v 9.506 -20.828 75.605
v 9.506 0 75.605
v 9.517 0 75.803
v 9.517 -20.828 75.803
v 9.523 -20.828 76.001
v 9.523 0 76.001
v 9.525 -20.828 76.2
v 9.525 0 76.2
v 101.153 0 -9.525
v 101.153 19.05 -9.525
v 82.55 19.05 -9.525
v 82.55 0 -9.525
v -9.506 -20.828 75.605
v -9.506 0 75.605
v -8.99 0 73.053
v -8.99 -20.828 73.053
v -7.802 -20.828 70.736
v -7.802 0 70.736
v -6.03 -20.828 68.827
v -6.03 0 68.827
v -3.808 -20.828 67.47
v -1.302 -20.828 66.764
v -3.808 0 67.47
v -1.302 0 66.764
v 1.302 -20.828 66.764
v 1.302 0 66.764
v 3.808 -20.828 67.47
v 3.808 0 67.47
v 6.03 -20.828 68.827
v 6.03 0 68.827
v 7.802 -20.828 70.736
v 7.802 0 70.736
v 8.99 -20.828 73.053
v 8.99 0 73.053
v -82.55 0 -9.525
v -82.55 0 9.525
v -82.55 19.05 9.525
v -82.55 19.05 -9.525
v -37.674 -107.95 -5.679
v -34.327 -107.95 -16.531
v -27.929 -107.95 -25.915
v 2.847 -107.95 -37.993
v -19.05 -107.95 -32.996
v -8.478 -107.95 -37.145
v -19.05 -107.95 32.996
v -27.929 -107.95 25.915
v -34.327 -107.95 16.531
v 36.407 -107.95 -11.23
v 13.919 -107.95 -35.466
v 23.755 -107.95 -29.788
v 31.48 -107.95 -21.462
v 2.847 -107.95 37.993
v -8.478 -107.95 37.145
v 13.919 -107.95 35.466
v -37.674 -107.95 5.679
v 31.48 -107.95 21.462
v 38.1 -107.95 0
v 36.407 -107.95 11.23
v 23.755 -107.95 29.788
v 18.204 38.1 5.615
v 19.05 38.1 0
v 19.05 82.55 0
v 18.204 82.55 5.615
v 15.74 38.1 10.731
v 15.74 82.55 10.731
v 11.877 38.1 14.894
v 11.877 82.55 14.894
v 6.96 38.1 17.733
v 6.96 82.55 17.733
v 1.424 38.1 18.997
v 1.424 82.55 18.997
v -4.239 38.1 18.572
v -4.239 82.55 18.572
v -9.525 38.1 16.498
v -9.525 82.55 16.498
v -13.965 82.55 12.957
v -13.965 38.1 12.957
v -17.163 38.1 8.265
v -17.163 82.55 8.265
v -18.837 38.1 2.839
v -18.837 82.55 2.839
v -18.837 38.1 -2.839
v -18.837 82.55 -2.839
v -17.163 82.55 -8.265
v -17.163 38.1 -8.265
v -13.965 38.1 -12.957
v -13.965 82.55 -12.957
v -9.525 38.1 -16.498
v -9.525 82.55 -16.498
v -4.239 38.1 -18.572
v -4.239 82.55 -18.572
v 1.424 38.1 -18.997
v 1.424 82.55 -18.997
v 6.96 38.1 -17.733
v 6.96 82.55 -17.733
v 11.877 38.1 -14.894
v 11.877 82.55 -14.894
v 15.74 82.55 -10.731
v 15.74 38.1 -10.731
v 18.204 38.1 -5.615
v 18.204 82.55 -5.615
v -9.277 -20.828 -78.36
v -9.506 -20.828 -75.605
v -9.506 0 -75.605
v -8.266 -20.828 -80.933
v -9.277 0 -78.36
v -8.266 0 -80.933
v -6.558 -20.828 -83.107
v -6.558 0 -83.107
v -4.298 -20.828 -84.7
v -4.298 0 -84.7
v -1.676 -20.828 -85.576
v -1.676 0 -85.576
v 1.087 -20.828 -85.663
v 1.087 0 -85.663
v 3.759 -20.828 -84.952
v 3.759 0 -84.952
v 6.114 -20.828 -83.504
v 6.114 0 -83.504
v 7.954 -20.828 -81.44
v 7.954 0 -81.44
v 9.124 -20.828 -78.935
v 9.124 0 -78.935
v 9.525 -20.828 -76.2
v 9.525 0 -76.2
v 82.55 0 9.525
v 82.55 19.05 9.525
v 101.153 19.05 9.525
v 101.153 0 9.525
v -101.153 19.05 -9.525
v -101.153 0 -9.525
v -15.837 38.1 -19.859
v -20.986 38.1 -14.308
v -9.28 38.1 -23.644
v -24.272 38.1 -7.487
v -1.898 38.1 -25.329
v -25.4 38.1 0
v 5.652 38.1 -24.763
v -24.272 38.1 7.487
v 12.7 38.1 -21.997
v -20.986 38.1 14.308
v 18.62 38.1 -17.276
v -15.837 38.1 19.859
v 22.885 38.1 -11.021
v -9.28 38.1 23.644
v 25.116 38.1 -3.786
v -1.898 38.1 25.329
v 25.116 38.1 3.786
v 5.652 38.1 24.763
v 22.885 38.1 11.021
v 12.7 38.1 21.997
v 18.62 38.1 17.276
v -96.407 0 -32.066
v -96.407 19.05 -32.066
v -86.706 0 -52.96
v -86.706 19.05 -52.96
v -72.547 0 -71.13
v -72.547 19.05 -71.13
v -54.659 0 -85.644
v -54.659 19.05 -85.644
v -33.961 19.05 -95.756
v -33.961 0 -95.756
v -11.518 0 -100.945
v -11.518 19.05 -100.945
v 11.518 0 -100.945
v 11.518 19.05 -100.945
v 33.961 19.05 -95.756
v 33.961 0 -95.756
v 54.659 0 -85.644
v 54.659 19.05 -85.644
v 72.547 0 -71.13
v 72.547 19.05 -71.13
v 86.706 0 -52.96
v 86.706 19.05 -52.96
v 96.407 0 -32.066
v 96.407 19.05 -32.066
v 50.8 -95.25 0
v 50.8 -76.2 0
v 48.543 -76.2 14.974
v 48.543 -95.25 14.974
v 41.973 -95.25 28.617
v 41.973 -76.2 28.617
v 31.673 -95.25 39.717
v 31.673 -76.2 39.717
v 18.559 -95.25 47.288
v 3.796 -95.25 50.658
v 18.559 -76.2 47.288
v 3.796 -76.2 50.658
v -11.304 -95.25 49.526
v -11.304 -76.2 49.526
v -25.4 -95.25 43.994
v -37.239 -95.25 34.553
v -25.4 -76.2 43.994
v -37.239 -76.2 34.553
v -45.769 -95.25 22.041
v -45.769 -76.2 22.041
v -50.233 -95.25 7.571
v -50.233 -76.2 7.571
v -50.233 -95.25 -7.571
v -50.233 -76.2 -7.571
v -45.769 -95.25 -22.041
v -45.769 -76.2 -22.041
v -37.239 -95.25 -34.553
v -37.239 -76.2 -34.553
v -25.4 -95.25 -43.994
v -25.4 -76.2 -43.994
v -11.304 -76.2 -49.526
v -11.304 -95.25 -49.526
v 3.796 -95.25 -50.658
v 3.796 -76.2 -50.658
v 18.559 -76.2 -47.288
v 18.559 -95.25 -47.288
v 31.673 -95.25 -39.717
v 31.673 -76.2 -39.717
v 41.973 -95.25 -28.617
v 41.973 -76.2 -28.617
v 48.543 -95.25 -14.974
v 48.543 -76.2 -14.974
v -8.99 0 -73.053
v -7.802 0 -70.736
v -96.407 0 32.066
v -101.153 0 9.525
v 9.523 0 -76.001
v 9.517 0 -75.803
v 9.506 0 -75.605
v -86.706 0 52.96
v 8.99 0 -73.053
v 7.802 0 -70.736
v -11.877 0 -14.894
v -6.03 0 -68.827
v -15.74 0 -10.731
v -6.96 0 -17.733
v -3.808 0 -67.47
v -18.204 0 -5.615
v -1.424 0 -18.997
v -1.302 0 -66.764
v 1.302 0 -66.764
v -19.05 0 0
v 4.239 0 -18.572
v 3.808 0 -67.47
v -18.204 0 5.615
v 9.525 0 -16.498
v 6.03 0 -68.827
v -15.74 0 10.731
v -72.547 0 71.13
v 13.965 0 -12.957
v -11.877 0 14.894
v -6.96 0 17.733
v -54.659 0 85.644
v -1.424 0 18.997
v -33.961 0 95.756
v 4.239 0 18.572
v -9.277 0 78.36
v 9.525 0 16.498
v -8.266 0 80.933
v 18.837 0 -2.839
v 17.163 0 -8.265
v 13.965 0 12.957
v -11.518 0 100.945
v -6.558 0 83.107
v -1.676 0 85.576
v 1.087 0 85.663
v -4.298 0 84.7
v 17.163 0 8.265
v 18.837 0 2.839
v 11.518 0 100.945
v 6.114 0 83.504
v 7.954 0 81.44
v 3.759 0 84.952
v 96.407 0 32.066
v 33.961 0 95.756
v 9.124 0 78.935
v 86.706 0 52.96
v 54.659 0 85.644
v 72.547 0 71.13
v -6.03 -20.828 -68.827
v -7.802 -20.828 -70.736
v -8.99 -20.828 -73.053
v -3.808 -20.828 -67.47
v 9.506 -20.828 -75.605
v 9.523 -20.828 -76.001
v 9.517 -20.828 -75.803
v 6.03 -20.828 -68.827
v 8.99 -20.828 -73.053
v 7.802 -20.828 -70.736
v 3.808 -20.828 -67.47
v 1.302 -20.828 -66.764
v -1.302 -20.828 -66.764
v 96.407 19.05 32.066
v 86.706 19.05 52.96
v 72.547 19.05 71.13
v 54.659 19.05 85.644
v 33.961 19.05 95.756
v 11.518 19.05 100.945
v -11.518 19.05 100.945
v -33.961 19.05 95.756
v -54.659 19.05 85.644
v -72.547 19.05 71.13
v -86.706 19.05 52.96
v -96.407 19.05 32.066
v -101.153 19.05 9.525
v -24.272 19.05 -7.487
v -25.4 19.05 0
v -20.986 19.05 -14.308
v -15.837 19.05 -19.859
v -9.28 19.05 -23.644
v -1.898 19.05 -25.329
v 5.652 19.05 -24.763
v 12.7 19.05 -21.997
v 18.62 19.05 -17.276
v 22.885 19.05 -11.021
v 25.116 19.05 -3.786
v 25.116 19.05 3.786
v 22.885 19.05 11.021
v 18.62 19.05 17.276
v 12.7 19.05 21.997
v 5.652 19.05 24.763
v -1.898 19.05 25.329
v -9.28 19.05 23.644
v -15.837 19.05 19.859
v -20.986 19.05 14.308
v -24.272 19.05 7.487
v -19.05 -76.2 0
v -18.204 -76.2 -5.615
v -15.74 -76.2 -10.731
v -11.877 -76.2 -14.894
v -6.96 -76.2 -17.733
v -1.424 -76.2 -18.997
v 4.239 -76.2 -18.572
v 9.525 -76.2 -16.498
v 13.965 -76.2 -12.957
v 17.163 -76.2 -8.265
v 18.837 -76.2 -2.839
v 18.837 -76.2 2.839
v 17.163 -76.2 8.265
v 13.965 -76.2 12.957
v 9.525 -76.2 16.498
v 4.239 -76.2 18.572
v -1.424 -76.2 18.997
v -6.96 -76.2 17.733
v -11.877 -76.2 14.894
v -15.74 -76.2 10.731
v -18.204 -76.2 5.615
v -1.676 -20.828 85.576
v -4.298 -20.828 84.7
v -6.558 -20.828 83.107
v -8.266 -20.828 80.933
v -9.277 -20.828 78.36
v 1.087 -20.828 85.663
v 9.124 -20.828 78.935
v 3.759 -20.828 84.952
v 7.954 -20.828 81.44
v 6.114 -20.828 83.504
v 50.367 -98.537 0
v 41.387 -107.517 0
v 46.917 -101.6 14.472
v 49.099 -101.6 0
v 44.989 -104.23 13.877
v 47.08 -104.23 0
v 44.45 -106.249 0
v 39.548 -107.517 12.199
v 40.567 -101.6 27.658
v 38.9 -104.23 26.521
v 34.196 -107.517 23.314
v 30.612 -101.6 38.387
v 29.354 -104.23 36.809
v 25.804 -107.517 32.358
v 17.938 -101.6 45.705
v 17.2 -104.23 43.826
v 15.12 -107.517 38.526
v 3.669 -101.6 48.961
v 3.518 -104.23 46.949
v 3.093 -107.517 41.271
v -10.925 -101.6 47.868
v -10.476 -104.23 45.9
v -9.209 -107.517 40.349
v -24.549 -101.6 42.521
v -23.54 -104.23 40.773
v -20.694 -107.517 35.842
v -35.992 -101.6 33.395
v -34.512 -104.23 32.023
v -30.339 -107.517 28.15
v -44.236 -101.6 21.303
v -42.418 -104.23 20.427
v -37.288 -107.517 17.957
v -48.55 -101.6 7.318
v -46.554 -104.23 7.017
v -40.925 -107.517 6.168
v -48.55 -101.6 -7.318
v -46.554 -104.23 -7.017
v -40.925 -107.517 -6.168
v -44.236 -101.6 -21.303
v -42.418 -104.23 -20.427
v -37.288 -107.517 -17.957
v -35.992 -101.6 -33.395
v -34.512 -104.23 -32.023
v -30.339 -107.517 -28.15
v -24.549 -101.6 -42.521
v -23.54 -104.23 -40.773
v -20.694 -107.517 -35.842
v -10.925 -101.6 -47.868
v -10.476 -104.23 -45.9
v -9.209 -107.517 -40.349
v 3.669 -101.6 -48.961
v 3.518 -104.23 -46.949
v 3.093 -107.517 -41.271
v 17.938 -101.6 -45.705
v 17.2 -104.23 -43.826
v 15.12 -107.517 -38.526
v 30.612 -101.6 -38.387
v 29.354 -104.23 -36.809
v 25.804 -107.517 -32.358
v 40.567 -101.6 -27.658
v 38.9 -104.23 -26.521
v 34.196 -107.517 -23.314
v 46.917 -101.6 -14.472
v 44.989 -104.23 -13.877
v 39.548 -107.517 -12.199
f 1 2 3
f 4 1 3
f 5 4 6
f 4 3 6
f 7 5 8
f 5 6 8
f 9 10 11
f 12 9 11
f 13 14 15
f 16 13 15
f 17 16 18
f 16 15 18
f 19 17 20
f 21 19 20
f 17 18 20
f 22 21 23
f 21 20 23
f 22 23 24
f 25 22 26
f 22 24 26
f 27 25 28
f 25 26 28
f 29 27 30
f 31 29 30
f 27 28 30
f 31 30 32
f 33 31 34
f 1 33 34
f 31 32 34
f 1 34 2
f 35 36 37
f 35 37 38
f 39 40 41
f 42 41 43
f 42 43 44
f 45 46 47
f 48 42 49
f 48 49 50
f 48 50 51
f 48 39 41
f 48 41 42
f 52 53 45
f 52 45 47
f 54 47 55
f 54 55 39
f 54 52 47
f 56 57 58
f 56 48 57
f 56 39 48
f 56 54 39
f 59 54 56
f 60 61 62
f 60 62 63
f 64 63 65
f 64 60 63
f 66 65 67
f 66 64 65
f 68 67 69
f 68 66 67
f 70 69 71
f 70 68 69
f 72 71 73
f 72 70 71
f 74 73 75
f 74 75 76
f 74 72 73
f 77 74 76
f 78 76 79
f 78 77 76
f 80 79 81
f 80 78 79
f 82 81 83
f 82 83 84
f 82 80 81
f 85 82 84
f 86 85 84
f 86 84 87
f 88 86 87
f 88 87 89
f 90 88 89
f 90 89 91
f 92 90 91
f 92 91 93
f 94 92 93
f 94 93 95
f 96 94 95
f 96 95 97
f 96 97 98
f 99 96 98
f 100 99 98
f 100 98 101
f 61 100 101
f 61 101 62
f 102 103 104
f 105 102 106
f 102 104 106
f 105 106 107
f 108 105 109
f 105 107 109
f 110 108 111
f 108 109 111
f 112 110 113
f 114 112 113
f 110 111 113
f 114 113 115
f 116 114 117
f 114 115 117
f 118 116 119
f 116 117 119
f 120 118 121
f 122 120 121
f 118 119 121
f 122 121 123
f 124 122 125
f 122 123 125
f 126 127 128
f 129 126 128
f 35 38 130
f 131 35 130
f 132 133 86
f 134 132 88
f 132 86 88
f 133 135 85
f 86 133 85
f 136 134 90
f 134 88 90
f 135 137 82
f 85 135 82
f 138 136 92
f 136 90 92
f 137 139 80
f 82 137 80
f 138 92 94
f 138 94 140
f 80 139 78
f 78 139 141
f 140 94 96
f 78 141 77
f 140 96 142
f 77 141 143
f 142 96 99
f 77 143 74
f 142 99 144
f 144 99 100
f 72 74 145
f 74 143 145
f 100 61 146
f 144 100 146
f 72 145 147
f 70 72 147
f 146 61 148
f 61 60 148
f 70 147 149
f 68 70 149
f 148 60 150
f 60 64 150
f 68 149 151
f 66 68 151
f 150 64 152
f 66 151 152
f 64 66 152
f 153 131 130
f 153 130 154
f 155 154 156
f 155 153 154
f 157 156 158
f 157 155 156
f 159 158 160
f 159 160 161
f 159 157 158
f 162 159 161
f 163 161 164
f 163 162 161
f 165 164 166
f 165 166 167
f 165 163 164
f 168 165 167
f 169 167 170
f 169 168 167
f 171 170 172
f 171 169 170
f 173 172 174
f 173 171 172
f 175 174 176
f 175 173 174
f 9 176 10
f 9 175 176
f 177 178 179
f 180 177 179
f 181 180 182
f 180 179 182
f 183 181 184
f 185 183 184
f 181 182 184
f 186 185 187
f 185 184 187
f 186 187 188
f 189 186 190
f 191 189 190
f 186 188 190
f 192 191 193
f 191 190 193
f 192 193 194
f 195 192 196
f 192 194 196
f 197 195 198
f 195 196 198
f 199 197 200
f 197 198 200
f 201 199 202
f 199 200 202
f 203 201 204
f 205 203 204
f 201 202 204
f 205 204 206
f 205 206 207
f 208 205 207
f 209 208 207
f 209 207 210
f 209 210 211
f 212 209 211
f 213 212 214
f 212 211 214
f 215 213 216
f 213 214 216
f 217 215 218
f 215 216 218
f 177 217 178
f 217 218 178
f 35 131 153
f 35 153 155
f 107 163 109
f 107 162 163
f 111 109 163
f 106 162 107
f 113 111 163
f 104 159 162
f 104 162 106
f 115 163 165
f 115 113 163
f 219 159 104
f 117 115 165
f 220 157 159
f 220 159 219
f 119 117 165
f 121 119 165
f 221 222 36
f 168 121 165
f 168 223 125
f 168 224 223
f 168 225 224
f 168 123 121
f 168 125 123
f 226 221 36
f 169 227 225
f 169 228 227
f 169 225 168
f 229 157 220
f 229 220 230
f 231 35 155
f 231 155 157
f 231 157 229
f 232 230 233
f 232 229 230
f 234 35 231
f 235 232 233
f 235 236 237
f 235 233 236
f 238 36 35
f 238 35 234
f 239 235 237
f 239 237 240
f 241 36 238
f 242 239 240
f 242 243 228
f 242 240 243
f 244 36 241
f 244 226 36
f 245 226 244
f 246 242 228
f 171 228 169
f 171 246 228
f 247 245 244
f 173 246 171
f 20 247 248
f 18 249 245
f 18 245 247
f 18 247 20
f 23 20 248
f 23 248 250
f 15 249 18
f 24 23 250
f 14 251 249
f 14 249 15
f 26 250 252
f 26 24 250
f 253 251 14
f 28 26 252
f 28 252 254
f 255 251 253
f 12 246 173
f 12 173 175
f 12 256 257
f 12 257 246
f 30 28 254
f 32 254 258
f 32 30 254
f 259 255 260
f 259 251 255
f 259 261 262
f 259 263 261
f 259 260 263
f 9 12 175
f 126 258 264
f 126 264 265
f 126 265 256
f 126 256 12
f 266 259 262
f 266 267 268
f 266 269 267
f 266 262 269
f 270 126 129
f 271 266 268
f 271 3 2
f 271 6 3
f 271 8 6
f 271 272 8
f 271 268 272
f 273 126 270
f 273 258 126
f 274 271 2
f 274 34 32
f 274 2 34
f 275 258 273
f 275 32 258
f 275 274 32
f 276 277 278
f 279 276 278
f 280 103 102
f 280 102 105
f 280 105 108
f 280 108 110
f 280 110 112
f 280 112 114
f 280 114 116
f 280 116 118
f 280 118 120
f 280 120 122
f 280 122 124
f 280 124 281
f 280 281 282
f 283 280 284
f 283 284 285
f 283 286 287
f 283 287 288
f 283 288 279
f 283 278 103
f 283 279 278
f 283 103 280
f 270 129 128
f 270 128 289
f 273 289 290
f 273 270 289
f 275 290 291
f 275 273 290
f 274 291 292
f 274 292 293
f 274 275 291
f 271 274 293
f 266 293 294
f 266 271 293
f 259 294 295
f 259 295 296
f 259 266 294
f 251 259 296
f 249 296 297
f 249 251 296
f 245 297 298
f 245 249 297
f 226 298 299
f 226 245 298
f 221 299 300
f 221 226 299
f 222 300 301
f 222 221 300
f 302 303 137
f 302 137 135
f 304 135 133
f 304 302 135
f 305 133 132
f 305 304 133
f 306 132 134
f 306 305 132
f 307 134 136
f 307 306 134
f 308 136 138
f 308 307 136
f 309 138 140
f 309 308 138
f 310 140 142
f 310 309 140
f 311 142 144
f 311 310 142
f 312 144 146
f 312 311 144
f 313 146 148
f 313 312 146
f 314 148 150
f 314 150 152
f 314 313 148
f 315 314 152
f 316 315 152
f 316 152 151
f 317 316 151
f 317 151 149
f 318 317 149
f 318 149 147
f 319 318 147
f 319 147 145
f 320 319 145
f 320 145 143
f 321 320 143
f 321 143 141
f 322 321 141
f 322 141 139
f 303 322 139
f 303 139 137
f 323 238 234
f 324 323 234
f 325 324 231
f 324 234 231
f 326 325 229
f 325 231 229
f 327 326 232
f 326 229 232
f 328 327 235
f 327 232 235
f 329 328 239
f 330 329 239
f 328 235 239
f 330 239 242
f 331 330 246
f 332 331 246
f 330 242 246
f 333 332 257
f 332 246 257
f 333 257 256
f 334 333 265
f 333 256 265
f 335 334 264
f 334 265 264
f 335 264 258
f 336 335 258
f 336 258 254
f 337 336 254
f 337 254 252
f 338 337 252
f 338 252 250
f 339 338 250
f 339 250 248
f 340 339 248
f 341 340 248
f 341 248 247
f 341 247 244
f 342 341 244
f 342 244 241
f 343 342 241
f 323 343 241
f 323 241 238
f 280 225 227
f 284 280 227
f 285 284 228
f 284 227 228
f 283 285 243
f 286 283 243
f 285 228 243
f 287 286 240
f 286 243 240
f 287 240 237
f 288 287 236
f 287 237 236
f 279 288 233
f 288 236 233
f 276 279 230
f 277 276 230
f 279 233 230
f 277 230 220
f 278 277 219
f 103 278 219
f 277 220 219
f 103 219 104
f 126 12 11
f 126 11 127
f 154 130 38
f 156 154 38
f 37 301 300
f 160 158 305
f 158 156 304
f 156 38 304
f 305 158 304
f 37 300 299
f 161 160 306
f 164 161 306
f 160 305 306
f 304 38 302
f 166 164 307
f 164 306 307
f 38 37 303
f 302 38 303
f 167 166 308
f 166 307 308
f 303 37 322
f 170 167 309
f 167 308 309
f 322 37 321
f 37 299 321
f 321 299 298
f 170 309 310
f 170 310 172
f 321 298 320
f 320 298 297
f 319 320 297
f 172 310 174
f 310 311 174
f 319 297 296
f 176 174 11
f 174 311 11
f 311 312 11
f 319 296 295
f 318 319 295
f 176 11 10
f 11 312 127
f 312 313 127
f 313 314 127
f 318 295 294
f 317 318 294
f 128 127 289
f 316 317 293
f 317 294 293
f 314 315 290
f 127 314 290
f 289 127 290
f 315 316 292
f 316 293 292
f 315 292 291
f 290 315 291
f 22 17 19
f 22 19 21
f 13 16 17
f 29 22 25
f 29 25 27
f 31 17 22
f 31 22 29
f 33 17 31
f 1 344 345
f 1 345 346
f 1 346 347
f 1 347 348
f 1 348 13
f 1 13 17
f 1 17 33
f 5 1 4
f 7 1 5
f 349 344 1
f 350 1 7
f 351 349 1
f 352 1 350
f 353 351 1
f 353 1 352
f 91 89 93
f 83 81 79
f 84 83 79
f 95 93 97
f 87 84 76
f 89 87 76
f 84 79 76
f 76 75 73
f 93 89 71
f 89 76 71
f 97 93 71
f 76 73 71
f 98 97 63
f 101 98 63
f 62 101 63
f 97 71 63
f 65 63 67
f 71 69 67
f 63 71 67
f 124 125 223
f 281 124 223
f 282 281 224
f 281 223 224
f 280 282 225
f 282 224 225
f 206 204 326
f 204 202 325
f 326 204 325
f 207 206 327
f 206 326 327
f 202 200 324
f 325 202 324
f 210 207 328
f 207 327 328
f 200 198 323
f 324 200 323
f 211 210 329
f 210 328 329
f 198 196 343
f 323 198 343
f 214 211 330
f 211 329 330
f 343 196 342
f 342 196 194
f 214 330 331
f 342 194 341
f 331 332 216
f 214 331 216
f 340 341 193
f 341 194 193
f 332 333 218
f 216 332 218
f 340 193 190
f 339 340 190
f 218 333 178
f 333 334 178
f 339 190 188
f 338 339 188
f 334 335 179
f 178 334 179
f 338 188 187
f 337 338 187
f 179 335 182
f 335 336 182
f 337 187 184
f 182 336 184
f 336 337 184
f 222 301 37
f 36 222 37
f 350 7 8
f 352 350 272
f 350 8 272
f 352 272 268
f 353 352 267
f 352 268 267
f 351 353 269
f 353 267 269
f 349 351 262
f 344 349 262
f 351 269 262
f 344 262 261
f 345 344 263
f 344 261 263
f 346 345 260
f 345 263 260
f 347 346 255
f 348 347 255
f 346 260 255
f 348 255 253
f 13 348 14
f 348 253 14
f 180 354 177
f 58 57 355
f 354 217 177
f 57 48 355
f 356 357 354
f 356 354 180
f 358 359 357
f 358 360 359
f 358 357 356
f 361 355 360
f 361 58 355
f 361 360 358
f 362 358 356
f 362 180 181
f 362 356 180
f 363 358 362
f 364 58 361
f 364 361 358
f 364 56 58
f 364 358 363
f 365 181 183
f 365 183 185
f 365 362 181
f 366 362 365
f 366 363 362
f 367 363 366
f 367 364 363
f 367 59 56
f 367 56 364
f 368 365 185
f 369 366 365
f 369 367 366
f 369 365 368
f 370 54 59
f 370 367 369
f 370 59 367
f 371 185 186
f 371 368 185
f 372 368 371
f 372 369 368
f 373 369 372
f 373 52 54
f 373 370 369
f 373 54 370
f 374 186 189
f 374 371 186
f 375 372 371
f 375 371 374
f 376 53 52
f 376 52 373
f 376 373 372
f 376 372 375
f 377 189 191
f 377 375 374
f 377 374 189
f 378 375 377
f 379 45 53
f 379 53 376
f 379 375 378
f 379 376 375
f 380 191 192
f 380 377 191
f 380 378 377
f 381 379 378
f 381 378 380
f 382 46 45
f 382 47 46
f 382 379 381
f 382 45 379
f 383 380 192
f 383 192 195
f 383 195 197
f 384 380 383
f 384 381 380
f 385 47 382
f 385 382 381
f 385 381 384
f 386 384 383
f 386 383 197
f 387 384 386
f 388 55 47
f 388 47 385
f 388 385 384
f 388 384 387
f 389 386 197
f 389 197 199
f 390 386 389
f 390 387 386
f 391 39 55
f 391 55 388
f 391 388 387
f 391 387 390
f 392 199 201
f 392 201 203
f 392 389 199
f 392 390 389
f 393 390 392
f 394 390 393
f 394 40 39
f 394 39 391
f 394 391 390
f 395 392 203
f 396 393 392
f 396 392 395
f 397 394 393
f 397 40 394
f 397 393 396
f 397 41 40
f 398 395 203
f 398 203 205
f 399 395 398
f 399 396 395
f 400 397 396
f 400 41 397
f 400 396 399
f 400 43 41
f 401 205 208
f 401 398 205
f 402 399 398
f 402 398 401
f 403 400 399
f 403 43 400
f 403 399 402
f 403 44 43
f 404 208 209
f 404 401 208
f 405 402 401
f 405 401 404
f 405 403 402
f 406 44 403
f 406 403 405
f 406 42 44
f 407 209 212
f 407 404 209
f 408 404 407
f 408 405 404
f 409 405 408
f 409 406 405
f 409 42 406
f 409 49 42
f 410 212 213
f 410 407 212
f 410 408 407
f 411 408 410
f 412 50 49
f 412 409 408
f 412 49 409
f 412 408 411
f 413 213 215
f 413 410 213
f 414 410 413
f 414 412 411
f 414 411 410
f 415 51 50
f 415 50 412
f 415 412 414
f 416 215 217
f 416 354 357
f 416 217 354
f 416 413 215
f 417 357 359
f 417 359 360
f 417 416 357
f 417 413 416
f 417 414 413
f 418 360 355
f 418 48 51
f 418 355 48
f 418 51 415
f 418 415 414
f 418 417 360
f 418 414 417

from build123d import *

# Parameters (mm, degrees)
F1_DEPTH = 19.05
F2_DEPTH = 76.2
F3_DEPTH = 20.828
F4_DEPTH = 38.1
F5_DEPTH = 63.5
F6_R     = 50.8
F6_R_2   = 19.05
F7_DEPTH = 31.75
F8_R     = 12.7


with BuildPart() as f1:
    # F0 (on Front) → F1 (new body)
    with BuildSketch(Plane.XZ):
        with BuildLine():
            Line((82.55, 9.525), (101.1525302452, 9.525))
            ThreePointArc((101.1525302452, 9.525), (0, 101.6), (-101.1525302452, 9.525))
            Line((-101.1525302452, 9.525), (-82.55, 9.525))
            Line((-82.55, 9.525), (-82.55, 0))
            Line((-82.55, 0), (-76.2, 0))
            ThreePointArc((-76.2, 0), (-57.1437924233, 50.4086003325), (-9.5063782813, 75.6046875))
            ThreePointArc((-9.5063782813, 75.6046875), (-0.2978018389, 85.7203434321), (9.525, 76.2))
            ThreePointArc((9.525, 76.2), (9.5203434321, 75.9021981611), (9.5063782813, 75.6046875))
            ThreePointArc((9.5063782813, 75.6046875), (57.1437924233, 50.4086003325), (76.2, 0))
            Line((76.2, 0), (82.55, 0))
            Line((82.55, 0), (82.55, 9.525))
        make_face()
        with BuildLine():
            ThreePointArc((-101.1525302452, -9.525), (0, -101.6), (101.1525302452, -9.525))
            Line((101.1525302452, -9.525), (82.55, -9.525))
            Line((82.55, -9.525), (82.55, 0))
            Line((82.55, 0), (76.2, 0))
            ThreePointArc((76.2, 0), (57.1437924233, -50.4086003325), (9.5063782813, -75.6046875))
            ThreePointArc((9.5063782813, -75.6046875), (9.5203434321, -75.9021981611), (9.525, -76.2))
            ThreePointArc((9.525, -76.2), (-0.2978018389, -85.7203434321), (-9.5063782813, -75.6046875))
            ThreePointArc((-9.5063782813, -75.6046875), (-57.1437924233, -50.4086003325), (-76.2, 0))
            Line((-76.2, 0), (-82.55, 0))
            Line((-82.55, 0), (-82.55, -9.525))
            Line((-82.55, -9.525), (-101.1525302452, -9.525))
        make_face()
        with BuildLine():
            ThreePointArc((9.5063782813, -75.6046875), (57.1437924233, -50.4086003325), (76.2, 0))
            Line((76.2, 0), (50.8, 0))
            ThreePointArc((50.8, 0), (0, -50.8), (-50.8, 0))
            Line((-50.8, 0), (-76.2, 0))
            ThreePointArc((-76.2, 0), (-57.1437924233, -50.4086003325), (-9.5063782813, -75.6046875))
            ThreePointArc((-9.5063782813, -75.6046875), (0, -66.675), (9.5063782813, -75.6046875))
        make_face()
        with BuildLine():
            ThreePointArc((-50.8, 0), (0, -50.8), (50.8, 0))
            Line((50.8, 0), (25.4, 0))
            ThreePointArc((25.4, 0), (0, -25.4), (-25.4, 0))
            Line((-25.4, 0), (-50.8, 0))
        make_face()
        with BuildLine():
            Line((25.4, 0), (50.8, 0))
            ThreePointArc((50.8, 0), (0, 50.8), (-50.8, 0))
            Line((-50.8, 0), (-25.4, 0))
            ThreePointArc((-25.4, 0), (0, 25.4), (25.4, 0))
        make_face()
        with BuildLine():
            Line((50.8, 0), (76.2, 0))
            ThreePointArc((76.2, 0), (57.1437924233, 50.4086003325), (9.5063782813, 75.6046875))
            ThreePointArc((9.5063782813, 75.6046875), (0, 66.675), (-9.5063782813, 75.6046875))
            ThreePointArc((-9.5063782813, 75.6046875), (-57.1437924233, 50.4086003325), (-76.2, 0))
            Line((-76.2, 0), (-50.8, 0))
            ThreePointArc((-50.8, 0), (0, 50.8), (50.8, 0))
        make_face()
        with BuildLine():
            ThreePointArc((-19.05, 0), (0, -19.05), (19.05, 0))
            Line((19.05, 0), (0, 0))
            Line((0, 0), (-19.05, 0))
        make_face()
        with BuildLine():
            Line((0, 0), (19.05, 0))
            ThreePointArc((19.05, 0), (0, 19.05), (-19.05, 0))
            Line((-19.05, 0), (0, 0))
        make_face()
        with BuildLine():
            ThreePointArc((9.525, -76.2), (9.5203434321, -75.9021981611), (9.5063782813, -75.6046875))
            ThreePointArc((9.5063782813, -75.6046875), (0, -76.2), (-9.5063782813, -75.6046875))
            ThreePointArc((-9.5063782813, -75.6046875), (-0.2978018389, -85.7203434321), (9.525, -76.2))
        make_face()
        with BuildLine():
            ThreePointArc((-9.5063782813, 75.6046875), (0, 66.675), (9.5063782813, 75.6046875))
            ThreePointArc((9.5063782813, 75.6046875), (0, 76.2), (-9.5063782813, 75.6046875))
        make_face()
        with BuildLine():
            ThreePointArc((-9.5063782813, 75.6046875), (0, 76.2), (9.5063782813, 75.6046875))
            ThreePointArc((9.5063782813, 75.6046875), (9.5203434321, 75.9021981611), (9.525, 76.2))
            ThreePointArc((9.525, 76.2), (-0.2978018389, 85.7203434321), (-9.5063782813, 75.6046875))
        make_face()
        with BuildLine():
            ThreePointArc((-9.5063782813, -75.6046875), (0, -76.2), (9.5063782813, -75.6046875))
            ThreePointArc((9.5063782813, -75.6046875), (0, -66.675), (-9.5063782813, -75.6046875))
        make_face()
        with BuildLine():
            ThreePointArc((-25.4, 0), (0, -25.4), (25.4, 0))
            Line((25.4, 0), (19.05, 0))
            ThreePointArc((19.05, 0), (0, -19.05), (-19.05, 0))
            Line((-19.05, 0), (-25.4, 0))
        make_face()
        with BuildLine():
            Line((19.05, 0), (25.4, 0))
            ThreePointArc((25.4, 0), (0, 25.4), (-25.4, 0))
            Line((-25.4, 0), (-19.05, 0))
            ThreePointArc((-19.05, 0), (0, 19.05), (19.05, 0))
        make_face()
    extrude(amount=-F1_DEPTH)

    # F0 (on Front) → F2 (join)
    with BuildSketch(Plane.XZ):
        with BuildLine():
            Line((0, 0), (19.05, 0))
            ThreePointArc((19.05, 0), (0, 19.05), (-19.05, 0))
            Line((-19.05, 0), (0, 0))
        make_face()
        with BuildLine():
            ThreePointArc((-19.05, 0), (0, -19.05), (19.05, 0))
            Line((19.05, 0), (0, 0))
            Line((0, 0), (-19.05, 0))
        make_face()
    extrude(amount=F2_DEPTH)

    # F0 (on Front) → F3 (join)
    with BuildSketch(Plane.XZ):
        with BuildLine():
            ThreePointArc((-9.5063782813, -75.6046875), (0, -76.2), (9.5063782813, -75.6046875))
            ThreePointArc((9.5063782813, -75.6046875), (0, -66.675), (-9.5063782813, -75.6046875))
        make_face()
        with BuildLine():
            ThreePointArc((9.525, -76.2), (9.5203434321, -75.9021981611), (9.5063782813, -75.6046875))
            ThreePointArc((9.5063782813, -75.6046875), (0, -76.2), (-9.5063782813, -75.6046875))
            ThreePointArc((-9.5063782813, -75.6046875), (-0.2978018389, -85.7203434321), (9.525, -76.2))
        make_face()
        with BuildLine():
            ThreePointArc((-9.5063782813, 75.6046875), (0, 66.675), (9.5063782813, 75.6046875))
            ThreePointArc((9.5063782813, 75.6046875), (0, 76.2), (-9.5063782813, 75.6046875))
        make_face()
        with BuildLine():
            ThreePointArc((-9.5063782813, 75.6046875), (0, 76.2), (9.5063782813, 75.6046875))
            ThreePointArc((9.5063782813, 75.6046875), (9.5203434321, 75.9021981611), (9.525, 76.2))
            ThreePointArc((9.525, 76.2), (-0.2978018389, 85.7203434321), (-9.5063782813, 75.6046875))
        make_face()
    extrude(amount=F3_DEPTH)

    # F0 (on Front) → F4 (join)
    with BuildSketch(Plane.XZ):
        with BuildLine():
            Line((19.05, 0), (25.4, 0))
            ThreePointArc((25.4, 0), (0, 25.4), (-25.4, 0))
            Line((-25.4, 0), (-19.05, 0))
            ThreePointArc((-19.05, 0), (0, 19.05), (19.05, 0))
        make_face()
        with BuildLine():
            ThreePointArc((-25.4, 0), (0, -25.4), (25.4, 0))
            Line((25.4, 0), (19.05, 0))
            ThreePointArc((19.05, 0), (0, -19.05), (-19.05, 0))
            Line((-19.05, 0), (-25.4, 0))
        make_face()
    extrude(amount=-F4_DEPTH)

    # F5 (add): a face of the model
    f5_faces = [f1.faces().sort_by_distance(p)[0] for p in [
        (0, 19.05, 0),
    ]]
    extrude(f5_faces, amount=F5_DEPTH)

    # F6 (on face) → F7 (join)
    with BuildSketch(Plane.XZ.offset(76.2)):
        Circle(F6_R)
        Circle(F6_R_2, mode=Mode.SUBTRACT)
        Circle(F6_R_2)
    extrude(amount=F7_DEPTH)

    # F8
    f8_edges = [f1.edges().sort_by_distance(p)[0] for p in [
        (-50.8, -107.95, 0),
    ]]
    fillet(f8_edges, radius=F8_R)


solid = f1.part
